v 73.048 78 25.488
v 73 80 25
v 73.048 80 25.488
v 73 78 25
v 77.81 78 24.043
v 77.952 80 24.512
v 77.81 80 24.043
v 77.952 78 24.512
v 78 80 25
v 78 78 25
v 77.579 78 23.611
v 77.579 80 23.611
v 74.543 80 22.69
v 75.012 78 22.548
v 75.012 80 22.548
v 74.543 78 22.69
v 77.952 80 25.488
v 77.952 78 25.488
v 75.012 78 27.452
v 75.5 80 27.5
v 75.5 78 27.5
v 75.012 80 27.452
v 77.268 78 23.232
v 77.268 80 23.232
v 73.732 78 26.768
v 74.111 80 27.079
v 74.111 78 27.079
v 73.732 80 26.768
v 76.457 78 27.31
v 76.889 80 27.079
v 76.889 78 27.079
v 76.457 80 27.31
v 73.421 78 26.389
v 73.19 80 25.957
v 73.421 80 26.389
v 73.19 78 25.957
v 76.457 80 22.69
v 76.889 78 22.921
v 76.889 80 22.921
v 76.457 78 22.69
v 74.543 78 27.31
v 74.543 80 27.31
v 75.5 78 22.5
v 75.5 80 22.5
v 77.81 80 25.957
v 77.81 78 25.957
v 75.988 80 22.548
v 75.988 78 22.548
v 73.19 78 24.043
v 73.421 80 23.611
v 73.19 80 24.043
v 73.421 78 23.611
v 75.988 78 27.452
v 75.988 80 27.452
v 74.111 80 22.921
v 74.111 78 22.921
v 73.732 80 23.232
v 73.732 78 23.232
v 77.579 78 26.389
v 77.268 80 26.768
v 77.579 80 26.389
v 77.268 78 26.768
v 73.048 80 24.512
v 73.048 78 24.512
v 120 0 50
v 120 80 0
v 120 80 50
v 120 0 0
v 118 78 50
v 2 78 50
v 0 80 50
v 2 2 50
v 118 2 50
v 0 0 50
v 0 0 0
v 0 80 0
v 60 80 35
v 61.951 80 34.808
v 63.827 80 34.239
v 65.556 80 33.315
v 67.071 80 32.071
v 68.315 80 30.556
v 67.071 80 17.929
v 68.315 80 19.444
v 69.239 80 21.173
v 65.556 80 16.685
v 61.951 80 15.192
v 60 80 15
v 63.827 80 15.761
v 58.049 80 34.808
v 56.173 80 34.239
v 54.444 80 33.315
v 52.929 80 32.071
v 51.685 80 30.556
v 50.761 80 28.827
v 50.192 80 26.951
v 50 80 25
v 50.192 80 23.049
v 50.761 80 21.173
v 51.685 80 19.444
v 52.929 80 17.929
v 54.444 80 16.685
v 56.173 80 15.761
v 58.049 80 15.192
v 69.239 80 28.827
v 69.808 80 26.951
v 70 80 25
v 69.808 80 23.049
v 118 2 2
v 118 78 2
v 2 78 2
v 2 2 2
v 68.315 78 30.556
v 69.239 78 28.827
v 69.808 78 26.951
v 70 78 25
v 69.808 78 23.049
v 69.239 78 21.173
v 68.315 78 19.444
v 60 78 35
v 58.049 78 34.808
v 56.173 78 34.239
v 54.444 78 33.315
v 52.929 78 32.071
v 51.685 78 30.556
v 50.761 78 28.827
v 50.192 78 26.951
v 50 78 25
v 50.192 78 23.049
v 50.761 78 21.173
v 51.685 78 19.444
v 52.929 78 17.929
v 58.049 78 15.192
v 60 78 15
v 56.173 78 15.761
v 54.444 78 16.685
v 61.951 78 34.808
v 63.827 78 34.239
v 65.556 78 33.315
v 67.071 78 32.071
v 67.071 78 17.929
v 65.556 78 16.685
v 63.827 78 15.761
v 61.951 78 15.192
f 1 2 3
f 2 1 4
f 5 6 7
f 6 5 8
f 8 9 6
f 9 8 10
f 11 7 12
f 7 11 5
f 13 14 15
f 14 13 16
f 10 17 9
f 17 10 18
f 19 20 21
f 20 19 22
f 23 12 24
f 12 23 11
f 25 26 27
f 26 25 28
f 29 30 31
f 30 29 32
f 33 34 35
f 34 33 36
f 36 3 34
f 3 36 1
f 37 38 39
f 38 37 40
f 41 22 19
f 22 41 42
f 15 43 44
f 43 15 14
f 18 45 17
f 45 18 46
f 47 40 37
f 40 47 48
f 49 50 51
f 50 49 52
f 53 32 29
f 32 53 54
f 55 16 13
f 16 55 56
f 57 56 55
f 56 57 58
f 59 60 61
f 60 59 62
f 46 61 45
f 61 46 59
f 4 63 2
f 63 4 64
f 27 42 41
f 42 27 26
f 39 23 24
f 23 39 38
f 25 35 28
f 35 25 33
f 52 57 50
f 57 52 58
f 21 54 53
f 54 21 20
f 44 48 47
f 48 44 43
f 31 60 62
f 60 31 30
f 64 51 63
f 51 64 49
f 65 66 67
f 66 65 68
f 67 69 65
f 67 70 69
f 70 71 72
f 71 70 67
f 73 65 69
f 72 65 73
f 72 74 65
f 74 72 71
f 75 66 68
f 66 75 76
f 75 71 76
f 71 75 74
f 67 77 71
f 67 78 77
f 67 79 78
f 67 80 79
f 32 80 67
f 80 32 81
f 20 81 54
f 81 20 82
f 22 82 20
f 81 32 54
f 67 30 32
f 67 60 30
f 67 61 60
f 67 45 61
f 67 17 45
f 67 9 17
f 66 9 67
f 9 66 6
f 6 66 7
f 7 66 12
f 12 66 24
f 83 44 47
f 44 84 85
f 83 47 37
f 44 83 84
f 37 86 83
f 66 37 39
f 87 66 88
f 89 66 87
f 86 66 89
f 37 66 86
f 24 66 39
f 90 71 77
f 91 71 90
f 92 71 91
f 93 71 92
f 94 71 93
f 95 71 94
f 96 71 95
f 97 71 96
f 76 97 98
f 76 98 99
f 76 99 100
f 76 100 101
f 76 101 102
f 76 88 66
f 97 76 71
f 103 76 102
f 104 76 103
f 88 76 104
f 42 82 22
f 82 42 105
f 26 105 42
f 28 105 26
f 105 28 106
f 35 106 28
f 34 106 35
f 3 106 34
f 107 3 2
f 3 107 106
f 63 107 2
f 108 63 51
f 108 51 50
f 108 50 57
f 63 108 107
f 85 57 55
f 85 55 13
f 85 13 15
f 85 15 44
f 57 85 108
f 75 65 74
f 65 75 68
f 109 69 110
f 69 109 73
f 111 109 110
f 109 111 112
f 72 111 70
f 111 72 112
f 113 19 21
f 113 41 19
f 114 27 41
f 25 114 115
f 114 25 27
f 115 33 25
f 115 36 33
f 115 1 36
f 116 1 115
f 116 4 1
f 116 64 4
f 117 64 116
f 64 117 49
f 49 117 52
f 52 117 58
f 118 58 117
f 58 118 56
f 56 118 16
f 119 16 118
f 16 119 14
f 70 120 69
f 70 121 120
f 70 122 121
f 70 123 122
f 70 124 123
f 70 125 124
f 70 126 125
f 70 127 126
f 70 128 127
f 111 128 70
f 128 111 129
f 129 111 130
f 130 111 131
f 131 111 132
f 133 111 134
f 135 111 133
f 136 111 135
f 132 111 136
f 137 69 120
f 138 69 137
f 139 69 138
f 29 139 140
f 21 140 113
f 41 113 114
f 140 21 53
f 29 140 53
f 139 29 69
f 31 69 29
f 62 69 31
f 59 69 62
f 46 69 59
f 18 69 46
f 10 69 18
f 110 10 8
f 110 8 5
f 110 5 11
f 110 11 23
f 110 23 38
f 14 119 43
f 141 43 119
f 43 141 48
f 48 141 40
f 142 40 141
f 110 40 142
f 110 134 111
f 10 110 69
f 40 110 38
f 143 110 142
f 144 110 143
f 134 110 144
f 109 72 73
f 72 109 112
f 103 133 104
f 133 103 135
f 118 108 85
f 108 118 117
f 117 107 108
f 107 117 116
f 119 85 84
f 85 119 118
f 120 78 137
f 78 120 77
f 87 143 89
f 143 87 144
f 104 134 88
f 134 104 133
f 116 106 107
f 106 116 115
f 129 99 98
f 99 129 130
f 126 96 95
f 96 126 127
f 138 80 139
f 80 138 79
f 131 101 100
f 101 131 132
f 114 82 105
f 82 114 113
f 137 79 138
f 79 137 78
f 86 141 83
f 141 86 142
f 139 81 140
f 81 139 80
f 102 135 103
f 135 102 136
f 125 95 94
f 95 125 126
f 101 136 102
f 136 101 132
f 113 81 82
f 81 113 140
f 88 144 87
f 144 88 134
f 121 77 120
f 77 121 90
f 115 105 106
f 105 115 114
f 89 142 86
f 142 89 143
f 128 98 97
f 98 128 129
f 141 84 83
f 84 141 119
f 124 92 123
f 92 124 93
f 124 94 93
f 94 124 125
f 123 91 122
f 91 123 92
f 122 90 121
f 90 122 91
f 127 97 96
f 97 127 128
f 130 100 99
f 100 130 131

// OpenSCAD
$fn = 32;

// ----------------------------------------------------------------------
// Vent box: roundvent enclosure
// ----------------------------------------------------------------------

// --- parameters (mm) ---
box_l = 120;              // box length, X
box_w = 80;               // box width, Y
box_h = 50;               // box height, Z
wall_t = 2;               // shell wall thickness
vent_d = 20;              // central vent diameter
ring_d = 5;               // ring hole diameter
n_ring = 6;               // holes in the ring
ring_r = 15.5;            // ring radius

ring_step = 360 / n_ring;  // ring hole angular step

difference() {
  cube([box_l, box_w, box_h]);
  translate([wall_t, wall_t, wall_t])
    cube([box_l - 2 * wall_t, box_w - 2 * wall_t, box_h]);
  translate([box_l / 2, box_w - wall_t - 1, box_h / 2])
    rotate([-90, 0, 0]) cylinder(h = wall_t + 2, d = vent_d);
  for (i = [0 : n_ring - 1])
    translate([box_l / 2, box_w - wall_t - 1, box_h / 2])
      rotate([0, 0, i * ring_step])
        translate([ring_r, 0, 0]) rotate([-90, 0, 0])
          cylinder(h = wall_t + 2, d = ring_d);
}
